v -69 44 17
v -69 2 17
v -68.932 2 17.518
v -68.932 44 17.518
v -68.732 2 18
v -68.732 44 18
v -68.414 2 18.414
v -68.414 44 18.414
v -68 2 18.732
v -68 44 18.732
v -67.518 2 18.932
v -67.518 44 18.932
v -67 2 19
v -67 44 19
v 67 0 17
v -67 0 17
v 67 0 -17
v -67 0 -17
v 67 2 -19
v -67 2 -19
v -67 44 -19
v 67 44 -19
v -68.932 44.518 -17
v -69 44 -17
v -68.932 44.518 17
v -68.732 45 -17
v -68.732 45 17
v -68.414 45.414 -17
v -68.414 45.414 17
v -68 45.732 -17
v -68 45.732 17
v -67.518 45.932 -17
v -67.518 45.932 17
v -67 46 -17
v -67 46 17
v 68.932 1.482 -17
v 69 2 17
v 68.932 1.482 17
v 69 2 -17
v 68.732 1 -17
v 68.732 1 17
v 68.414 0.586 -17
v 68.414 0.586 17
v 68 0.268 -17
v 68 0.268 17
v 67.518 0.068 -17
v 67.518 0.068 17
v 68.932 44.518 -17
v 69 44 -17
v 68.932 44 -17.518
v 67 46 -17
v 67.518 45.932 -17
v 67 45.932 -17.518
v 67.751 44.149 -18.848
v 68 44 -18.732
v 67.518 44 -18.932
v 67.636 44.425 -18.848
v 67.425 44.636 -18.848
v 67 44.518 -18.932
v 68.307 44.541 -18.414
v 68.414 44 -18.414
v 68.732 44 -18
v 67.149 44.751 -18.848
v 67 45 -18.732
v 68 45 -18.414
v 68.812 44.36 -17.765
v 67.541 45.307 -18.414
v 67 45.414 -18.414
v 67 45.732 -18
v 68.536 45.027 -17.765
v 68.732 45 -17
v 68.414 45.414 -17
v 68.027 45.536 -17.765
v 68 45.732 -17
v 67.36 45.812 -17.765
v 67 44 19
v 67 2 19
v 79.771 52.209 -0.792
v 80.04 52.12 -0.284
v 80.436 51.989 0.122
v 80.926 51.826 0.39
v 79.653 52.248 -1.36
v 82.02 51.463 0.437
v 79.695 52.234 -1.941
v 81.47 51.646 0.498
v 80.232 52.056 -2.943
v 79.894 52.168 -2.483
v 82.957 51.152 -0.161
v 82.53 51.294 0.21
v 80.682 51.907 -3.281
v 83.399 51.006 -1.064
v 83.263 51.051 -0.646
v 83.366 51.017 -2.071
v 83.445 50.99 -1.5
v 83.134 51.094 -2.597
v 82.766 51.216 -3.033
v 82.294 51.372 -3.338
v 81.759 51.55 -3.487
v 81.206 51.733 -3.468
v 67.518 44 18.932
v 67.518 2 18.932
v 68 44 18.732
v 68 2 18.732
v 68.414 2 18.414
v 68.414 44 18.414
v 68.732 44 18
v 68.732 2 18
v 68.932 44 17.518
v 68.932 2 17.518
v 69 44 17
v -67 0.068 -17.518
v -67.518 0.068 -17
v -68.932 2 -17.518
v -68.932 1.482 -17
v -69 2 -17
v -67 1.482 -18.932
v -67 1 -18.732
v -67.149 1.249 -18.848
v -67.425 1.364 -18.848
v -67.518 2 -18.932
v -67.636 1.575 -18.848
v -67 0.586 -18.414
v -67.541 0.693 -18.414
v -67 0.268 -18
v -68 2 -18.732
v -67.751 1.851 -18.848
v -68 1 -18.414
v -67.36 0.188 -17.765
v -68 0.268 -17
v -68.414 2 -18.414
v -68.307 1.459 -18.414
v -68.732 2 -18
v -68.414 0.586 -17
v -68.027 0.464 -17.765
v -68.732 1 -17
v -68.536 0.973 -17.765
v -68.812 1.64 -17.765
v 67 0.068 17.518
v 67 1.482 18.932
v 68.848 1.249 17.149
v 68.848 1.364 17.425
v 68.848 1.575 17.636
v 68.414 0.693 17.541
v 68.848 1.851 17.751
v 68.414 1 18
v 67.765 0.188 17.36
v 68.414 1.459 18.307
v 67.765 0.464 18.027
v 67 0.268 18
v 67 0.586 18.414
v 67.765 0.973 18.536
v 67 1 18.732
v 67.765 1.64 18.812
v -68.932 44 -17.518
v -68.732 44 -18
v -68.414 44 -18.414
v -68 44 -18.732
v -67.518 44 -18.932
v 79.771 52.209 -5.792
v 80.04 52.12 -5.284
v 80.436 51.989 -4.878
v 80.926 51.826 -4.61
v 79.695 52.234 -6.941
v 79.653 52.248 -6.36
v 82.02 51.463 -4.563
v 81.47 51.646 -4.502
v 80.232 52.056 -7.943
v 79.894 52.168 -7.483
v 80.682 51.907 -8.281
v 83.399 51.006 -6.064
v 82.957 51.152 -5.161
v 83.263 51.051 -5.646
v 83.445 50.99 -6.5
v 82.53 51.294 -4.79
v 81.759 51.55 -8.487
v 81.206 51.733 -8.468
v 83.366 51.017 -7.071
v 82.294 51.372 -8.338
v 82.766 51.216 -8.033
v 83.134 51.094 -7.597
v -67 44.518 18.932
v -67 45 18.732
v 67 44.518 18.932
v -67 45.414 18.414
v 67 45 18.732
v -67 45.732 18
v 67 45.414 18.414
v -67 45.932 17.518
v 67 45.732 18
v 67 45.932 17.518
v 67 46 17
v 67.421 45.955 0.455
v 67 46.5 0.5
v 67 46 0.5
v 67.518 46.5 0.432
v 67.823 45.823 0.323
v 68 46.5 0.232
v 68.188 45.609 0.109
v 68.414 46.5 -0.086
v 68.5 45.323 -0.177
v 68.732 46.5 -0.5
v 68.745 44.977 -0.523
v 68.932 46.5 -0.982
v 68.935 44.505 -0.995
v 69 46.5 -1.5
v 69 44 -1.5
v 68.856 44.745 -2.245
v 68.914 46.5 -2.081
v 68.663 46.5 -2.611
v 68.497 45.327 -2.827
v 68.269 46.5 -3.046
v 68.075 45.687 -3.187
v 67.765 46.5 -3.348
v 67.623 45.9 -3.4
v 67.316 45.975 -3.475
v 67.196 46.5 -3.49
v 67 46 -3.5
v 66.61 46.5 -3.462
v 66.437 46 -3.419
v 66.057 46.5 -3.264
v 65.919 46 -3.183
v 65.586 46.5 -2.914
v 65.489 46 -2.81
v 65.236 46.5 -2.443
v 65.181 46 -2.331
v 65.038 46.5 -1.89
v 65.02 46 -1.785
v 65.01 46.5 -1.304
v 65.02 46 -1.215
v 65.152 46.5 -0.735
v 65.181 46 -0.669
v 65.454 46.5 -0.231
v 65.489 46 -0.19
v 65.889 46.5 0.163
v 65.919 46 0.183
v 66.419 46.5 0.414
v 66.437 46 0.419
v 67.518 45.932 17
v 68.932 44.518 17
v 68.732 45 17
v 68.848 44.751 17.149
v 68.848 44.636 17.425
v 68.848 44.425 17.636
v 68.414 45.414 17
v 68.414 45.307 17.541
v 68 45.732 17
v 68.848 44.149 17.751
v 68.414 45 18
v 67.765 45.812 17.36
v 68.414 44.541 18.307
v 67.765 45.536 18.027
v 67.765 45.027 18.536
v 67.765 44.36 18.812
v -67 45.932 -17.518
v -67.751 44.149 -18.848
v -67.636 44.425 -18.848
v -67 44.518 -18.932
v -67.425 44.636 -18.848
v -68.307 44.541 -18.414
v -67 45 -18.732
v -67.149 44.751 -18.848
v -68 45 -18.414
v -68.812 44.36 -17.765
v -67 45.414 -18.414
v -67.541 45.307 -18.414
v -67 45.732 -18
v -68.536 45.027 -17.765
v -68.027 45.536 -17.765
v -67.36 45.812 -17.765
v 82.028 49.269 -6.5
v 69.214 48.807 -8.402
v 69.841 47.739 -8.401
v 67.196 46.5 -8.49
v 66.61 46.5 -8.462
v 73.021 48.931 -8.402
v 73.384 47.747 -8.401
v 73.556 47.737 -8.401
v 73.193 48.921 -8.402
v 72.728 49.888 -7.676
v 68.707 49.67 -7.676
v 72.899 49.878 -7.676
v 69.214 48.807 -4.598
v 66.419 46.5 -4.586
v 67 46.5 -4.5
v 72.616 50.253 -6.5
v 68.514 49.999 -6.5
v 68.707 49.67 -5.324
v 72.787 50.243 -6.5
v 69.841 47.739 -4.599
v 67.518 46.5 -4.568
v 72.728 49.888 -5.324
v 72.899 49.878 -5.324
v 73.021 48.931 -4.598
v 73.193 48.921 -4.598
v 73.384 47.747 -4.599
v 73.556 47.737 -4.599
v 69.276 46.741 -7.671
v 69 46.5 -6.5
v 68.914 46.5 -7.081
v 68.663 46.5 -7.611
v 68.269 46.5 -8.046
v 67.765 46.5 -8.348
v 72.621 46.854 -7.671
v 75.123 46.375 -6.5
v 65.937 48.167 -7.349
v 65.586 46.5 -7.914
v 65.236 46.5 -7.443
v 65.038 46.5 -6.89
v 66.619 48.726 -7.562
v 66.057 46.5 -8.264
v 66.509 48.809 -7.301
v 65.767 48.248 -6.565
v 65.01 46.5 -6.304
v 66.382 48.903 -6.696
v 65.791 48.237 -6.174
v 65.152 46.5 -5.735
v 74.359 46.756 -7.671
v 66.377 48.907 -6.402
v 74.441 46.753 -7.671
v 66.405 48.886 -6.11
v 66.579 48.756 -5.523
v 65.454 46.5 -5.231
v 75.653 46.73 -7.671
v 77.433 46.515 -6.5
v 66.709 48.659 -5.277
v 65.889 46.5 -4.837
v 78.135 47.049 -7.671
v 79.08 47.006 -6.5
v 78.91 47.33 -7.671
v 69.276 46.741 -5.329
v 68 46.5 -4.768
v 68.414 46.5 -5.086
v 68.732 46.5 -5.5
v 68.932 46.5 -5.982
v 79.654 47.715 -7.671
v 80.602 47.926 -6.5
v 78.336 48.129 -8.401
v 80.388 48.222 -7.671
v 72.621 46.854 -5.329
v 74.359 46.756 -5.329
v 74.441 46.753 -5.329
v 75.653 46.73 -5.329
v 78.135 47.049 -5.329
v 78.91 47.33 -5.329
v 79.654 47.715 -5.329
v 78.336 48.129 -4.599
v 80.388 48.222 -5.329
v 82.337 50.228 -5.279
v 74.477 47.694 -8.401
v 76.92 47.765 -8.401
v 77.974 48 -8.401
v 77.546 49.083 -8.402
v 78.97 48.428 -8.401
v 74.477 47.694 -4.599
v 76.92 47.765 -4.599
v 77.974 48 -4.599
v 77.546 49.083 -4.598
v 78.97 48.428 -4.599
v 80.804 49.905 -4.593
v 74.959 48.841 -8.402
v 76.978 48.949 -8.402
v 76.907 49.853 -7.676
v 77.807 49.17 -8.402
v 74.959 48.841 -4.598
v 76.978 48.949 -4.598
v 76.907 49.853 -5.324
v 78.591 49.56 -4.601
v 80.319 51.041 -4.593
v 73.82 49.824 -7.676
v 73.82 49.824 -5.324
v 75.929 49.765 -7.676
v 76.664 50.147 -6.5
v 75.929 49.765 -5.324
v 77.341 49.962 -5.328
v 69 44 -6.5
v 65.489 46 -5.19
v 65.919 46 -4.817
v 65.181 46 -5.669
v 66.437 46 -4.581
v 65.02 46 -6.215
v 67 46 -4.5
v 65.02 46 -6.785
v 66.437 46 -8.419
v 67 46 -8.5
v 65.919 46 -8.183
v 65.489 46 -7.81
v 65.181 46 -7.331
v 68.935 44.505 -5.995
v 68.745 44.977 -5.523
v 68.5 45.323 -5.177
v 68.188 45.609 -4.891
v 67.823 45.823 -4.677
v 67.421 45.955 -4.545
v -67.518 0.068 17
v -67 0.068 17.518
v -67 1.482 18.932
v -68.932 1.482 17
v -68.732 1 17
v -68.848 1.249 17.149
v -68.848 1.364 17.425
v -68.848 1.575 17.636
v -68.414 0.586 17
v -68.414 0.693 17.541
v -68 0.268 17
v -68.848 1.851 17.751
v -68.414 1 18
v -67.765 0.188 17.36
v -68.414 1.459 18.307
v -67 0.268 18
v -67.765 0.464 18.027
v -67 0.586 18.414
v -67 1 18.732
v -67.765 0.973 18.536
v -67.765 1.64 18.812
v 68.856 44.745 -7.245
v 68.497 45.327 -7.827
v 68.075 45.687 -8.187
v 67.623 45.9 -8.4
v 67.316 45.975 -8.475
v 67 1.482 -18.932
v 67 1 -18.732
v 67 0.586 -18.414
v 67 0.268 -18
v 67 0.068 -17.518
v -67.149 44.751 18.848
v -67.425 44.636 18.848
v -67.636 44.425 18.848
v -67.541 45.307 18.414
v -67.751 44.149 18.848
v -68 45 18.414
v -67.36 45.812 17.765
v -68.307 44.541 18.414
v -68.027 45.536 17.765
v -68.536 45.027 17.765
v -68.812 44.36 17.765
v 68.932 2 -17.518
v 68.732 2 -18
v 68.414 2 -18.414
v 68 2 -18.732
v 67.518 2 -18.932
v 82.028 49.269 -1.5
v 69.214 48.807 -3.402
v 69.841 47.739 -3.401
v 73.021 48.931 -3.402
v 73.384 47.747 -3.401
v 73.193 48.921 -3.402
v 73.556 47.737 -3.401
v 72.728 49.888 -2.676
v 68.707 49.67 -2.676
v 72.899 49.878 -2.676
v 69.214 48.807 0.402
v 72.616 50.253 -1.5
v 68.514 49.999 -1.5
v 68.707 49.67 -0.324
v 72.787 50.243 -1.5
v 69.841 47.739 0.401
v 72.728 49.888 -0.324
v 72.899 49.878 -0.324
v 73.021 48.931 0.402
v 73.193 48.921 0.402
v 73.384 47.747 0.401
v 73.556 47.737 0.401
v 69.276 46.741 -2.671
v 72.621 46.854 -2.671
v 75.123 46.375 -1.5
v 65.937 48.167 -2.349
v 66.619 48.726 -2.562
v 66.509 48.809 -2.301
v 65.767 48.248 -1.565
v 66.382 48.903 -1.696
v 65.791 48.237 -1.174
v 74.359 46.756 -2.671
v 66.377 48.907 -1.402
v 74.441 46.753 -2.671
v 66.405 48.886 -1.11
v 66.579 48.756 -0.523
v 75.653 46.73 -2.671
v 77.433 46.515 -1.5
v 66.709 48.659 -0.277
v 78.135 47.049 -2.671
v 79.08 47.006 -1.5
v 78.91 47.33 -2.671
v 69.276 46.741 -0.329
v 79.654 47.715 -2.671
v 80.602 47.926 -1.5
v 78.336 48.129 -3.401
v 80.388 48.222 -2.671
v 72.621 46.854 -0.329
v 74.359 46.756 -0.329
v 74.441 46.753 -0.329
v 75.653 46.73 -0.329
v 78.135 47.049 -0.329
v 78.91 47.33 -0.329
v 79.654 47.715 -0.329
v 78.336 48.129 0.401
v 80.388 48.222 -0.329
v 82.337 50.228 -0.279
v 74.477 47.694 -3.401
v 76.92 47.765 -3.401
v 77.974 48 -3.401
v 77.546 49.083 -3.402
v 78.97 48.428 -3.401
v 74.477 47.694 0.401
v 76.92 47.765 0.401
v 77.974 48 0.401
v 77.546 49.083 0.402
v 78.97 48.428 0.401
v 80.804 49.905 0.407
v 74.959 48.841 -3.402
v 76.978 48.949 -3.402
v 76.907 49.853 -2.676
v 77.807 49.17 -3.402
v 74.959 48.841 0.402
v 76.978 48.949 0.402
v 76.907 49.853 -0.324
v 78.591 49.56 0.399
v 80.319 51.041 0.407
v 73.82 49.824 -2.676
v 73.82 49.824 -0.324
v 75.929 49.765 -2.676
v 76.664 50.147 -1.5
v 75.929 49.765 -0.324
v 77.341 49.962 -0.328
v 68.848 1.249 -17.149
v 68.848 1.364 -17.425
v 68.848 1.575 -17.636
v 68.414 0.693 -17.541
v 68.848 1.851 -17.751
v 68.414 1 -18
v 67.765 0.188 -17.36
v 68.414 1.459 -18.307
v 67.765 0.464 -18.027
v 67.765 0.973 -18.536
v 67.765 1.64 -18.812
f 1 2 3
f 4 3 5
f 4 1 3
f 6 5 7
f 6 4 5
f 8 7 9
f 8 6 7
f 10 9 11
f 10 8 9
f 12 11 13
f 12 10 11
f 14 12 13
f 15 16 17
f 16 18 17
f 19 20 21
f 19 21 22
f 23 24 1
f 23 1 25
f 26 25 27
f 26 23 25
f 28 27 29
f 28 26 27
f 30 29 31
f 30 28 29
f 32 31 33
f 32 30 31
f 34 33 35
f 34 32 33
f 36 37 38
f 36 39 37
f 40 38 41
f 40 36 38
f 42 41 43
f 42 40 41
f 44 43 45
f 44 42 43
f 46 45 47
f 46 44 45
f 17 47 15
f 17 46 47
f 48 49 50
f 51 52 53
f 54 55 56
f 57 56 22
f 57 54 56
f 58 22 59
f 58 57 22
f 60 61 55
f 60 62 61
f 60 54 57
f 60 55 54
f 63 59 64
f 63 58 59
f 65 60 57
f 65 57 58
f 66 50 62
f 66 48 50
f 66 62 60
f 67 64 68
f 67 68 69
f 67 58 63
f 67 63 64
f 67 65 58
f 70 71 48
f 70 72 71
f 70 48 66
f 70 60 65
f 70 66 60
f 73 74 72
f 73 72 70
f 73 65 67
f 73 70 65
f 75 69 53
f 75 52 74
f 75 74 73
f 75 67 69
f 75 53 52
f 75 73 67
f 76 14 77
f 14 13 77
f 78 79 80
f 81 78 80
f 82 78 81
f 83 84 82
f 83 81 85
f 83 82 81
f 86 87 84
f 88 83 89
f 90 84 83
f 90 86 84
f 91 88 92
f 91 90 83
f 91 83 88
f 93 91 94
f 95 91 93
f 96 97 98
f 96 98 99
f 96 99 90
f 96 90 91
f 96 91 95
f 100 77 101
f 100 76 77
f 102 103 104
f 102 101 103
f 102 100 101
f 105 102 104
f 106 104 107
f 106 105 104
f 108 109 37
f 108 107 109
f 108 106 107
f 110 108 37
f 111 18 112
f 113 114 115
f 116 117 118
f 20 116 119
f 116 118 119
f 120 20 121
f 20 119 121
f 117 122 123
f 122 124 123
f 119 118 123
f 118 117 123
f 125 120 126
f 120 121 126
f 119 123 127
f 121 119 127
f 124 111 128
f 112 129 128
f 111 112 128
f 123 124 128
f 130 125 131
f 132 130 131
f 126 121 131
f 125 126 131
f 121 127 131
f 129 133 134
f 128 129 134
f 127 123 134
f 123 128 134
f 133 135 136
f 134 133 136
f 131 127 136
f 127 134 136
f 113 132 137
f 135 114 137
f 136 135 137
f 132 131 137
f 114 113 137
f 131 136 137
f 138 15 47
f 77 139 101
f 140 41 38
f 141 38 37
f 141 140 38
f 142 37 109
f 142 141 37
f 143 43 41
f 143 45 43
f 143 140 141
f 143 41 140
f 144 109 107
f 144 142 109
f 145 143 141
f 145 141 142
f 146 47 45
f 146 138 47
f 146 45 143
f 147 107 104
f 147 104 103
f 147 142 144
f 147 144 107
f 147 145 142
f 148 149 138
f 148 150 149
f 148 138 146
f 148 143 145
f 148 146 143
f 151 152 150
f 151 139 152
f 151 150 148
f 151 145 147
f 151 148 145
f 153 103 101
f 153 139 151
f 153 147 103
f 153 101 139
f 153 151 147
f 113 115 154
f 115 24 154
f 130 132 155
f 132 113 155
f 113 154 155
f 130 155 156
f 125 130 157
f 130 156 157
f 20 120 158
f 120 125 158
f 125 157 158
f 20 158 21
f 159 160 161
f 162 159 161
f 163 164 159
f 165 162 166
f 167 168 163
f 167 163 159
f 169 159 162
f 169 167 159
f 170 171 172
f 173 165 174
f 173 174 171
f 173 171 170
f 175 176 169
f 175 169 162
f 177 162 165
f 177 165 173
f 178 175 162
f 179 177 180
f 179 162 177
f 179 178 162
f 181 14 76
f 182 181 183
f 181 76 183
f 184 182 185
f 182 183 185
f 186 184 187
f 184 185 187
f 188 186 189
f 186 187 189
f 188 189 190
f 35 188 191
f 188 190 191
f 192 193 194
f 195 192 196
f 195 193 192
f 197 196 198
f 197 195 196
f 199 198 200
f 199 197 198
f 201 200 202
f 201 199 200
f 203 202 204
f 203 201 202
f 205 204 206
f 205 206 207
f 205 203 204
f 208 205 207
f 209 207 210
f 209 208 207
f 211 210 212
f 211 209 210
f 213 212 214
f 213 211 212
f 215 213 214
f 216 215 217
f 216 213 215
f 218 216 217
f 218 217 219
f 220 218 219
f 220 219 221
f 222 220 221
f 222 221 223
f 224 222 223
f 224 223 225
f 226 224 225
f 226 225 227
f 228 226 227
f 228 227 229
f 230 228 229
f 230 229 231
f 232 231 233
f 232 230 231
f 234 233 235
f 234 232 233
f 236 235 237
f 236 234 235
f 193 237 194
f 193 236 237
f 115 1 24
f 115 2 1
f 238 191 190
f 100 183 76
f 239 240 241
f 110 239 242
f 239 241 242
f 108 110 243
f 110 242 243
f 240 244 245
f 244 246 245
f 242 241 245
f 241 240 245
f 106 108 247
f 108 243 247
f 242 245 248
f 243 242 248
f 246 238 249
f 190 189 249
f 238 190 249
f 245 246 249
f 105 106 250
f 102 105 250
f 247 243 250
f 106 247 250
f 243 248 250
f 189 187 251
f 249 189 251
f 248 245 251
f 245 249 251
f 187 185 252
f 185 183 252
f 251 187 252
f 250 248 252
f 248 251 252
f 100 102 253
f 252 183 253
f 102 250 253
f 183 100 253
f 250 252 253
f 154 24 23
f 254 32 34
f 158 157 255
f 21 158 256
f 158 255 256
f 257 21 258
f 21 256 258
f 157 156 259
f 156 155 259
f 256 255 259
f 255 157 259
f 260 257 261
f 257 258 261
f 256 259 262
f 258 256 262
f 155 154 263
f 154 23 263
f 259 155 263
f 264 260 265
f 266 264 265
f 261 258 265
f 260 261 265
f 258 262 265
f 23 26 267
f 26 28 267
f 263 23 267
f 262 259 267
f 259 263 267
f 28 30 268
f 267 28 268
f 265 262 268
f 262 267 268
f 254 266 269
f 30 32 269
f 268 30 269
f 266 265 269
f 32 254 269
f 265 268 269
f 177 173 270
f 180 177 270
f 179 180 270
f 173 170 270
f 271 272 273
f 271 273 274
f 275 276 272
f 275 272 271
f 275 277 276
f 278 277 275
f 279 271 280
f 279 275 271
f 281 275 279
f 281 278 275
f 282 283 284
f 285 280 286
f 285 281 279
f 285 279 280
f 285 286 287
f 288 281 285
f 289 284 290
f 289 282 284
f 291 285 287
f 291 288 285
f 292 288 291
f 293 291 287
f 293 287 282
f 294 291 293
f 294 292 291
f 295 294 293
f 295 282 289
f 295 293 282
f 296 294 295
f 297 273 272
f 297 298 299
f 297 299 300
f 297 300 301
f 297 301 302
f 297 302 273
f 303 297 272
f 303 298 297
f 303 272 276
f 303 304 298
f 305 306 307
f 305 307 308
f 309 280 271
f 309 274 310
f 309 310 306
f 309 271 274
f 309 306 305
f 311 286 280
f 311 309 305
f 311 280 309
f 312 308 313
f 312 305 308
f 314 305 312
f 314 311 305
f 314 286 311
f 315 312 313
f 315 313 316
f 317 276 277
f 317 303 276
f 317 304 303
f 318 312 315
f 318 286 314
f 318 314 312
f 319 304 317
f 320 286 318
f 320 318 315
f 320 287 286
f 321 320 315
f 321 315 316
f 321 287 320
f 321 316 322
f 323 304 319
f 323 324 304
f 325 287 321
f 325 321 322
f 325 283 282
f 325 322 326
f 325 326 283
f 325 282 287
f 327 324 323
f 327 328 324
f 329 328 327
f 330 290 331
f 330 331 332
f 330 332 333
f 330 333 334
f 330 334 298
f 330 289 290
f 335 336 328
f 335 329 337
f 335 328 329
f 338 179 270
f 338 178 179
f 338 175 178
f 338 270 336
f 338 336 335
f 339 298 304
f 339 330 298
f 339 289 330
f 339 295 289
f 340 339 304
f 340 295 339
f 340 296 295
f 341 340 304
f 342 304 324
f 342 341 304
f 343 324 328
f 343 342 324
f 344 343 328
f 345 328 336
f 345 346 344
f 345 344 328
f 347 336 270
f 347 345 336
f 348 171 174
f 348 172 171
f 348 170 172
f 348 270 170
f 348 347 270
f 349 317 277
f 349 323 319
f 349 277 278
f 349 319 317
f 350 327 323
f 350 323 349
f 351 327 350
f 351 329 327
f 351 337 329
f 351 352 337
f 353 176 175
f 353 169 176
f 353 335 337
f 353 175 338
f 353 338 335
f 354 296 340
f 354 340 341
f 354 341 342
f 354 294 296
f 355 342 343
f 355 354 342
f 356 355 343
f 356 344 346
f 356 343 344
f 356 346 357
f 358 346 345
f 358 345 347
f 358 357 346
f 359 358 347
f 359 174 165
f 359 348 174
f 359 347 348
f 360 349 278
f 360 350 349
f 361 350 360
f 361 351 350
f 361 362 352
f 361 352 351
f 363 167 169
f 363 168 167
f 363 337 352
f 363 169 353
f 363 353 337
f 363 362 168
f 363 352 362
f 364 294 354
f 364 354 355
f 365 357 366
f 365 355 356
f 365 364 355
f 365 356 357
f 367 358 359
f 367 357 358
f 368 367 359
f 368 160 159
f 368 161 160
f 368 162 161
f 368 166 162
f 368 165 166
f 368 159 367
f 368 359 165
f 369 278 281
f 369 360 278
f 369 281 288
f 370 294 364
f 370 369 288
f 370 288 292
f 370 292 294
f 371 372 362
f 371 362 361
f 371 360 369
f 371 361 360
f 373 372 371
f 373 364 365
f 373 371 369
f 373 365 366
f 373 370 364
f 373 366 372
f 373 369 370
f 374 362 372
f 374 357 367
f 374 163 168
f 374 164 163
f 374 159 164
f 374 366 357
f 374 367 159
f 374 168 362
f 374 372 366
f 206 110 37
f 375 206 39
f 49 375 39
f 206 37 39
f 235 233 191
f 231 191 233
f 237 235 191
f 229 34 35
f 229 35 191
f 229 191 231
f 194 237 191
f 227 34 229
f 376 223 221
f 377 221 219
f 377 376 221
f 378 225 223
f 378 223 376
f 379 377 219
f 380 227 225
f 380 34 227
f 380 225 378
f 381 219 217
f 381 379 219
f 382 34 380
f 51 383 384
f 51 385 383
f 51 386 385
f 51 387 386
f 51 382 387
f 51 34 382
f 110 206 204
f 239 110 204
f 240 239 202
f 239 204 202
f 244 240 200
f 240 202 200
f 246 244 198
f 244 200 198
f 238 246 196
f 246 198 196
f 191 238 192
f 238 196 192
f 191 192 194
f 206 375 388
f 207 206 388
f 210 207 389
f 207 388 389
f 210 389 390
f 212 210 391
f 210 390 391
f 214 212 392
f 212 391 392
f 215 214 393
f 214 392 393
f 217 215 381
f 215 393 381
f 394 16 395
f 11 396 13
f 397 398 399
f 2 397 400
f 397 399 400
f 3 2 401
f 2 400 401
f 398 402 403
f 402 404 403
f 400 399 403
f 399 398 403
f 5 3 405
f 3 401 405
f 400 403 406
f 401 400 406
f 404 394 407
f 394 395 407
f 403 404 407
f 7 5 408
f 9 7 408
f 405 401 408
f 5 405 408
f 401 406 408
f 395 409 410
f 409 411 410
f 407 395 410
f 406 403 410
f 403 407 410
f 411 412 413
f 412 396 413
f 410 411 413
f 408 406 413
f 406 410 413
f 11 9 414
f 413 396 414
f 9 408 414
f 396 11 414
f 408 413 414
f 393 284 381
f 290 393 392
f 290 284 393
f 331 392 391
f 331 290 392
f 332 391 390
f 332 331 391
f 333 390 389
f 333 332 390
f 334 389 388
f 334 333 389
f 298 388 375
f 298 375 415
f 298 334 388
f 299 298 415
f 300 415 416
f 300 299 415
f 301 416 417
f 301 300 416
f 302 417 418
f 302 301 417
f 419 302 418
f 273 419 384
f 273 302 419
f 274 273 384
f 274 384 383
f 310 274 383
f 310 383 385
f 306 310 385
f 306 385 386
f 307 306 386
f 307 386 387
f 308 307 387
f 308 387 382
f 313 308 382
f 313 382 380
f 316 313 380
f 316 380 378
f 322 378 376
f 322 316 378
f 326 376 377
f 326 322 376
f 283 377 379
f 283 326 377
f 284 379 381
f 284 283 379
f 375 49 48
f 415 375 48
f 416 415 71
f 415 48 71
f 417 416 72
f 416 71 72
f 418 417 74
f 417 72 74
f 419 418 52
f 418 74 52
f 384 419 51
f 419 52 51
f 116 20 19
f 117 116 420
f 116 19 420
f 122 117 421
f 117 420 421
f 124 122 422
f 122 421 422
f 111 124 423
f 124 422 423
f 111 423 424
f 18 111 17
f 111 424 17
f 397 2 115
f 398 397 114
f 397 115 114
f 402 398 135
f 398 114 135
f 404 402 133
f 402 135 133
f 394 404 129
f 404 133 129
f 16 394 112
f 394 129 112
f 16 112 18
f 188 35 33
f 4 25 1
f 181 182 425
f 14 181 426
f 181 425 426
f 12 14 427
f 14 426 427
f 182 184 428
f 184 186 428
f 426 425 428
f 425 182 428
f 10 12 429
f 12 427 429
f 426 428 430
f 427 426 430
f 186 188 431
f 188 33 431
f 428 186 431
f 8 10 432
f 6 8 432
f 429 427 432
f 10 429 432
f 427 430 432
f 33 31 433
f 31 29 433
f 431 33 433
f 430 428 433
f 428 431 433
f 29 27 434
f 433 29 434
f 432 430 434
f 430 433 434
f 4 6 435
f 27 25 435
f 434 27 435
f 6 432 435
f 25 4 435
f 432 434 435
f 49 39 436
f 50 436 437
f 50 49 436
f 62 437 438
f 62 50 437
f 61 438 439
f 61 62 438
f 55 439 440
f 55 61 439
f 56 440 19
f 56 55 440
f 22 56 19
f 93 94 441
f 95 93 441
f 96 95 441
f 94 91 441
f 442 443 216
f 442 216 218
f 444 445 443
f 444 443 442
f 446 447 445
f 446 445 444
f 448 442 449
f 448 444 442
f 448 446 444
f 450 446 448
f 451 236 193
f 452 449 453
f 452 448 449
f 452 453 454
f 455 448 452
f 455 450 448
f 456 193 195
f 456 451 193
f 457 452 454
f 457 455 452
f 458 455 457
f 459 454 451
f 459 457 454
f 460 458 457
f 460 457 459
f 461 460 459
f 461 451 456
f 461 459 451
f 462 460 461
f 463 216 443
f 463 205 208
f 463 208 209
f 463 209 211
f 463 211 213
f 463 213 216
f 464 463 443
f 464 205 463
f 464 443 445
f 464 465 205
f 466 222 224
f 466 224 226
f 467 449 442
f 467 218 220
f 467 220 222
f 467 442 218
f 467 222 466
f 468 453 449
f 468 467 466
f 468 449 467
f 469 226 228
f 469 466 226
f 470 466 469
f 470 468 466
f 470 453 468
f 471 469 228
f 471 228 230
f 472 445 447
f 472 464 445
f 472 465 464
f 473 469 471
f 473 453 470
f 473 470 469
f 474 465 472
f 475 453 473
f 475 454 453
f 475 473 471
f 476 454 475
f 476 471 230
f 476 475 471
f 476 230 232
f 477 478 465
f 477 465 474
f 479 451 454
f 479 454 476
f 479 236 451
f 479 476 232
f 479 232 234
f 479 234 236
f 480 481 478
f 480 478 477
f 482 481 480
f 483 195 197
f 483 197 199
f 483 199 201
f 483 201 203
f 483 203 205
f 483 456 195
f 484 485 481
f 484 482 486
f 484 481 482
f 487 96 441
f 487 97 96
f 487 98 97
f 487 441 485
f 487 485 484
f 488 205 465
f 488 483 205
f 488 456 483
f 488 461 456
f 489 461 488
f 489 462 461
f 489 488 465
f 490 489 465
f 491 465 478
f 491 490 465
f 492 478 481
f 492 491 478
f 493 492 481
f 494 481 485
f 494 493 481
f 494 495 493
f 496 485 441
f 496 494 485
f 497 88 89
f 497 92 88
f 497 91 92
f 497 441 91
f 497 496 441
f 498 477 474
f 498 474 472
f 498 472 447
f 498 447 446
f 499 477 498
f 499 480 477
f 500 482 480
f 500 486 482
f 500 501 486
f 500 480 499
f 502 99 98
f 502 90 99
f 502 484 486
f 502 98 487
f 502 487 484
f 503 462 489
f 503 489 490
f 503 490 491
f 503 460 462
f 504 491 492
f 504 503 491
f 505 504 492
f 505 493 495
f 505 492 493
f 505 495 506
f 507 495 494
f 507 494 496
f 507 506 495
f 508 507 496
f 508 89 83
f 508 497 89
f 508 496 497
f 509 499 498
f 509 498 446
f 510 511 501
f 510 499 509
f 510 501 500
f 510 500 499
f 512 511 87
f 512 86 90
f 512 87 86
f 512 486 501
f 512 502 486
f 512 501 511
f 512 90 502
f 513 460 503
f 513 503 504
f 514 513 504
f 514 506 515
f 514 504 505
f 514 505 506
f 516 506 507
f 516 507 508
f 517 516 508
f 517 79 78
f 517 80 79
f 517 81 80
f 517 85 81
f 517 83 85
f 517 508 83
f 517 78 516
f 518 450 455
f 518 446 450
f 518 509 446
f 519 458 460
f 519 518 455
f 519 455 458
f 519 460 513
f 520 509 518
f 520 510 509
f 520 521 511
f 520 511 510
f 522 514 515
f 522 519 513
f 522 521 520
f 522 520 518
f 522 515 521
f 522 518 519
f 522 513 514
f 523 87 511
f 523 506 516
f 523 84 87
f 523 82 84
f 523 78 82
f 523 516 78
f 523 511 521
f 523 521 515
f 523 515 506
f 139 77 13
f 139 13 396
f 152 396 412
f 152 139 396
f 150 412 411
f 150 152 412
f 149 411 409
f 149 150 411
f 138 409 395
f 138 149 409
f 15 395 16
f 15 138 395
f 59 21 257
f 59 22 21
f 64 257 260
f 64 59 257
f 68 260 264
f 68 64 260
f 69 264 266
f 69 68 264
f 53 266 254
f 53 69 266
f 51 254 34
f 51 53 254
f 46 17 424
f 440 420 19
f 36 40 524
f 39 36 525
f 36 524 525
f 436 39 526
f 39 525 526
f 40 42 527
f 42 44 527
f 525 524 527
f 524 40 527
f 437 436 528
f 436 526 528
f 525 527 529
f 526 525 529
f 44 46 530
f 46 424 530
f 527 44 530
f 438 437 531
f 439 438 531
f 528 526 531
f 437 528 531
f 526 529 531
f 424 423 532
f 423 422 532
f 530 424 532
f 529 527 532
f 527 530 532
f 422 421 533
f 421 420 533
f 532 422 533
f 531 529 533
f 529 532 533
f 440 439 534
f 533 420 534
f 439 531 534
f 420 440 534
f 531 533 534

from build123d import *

# Parameters (mm, degrees)
SZKIC1_W                         = 138
SZKIC1_H                         = 38
DODANIE_WYCI_GNI_CIE1_DEPTH      = 46
ZAOKR_GLENIE1_R                  = 2
DODANIE_WYCI_GNI_CIE2_REACH      = 87.348
DODANIE_WYCI_GNI_CIE2_END_RADIUS = 2
SZKIC3_R                         = 2
SZKIC5_R                         = 2


with BuildPart() as part:
    # Szkic1 → Dodanie-wyciągnięcie1 (new body)
    with BuildSketch(Plane(origin=(0, 0, 0), x_dir=(1, 0, 0), z_dir=(0, 1, 0))):
        Rectangle(SZKIC1_W, SZKIC1_H)
    extrude(amount=DODANIE_WYCI_GNI_CIE1_DEPTH)

    # Zaokrąglenie1
    zaokr_glenie1_edges = [part.edges().sort_by_distance(p)[0] for p in [
        (-69, 46, 0),
        (0, 46, 19),
        (69, 46, 0),
        (0, 0, 19),
        (-69, 0, 0),
        (0, 0, -19),
        (69, 0, 0),
        (69, 23, 19),
        (-69, 23, 19),
        (-69, 23, -19),
        (69, 23, -19),
        (0, 46, -19),
    ]]
    fillet(zaokr_glenie1_edges, radius=ZAOKR_GLENIE1_R)

    # Dodanie-wyciągnięcie2: up to this cylinder (the profile starts outside it)
    dodanie_wyci_gni_cie2_end = Plane(origin=(67, 44, -4), z_dir=(0, 0, -1)) * Cylinder(DODANIE_WYCI_GNI_CIE2_END_RADIUS, 184.696, mode=Mode.PRIVATE)
    # Szkic3 → Dodanie-wyciągnięcie2 (add, up to the surface)
    with BuildSketch(Plane(origin=(0, 46.5, 0), x_dir=(1, 0, 0), z_dir=(0, 1, 0)), mode=Mode.PRIVATE) as dodanie_wyci_gni_cie2_sk1:
        with Locations(Location((67, 6.5, 0), (0, 0, 270))):
            Circle(SZKIC3_R)
    dodanie_wyci_gni_cie2_tool1 = extrude(dodanie_wyci_gni_cie2_sk1.sketch, amount=-DODANIE_WYCI_GNI_CIE2_REACH, mode=Mode.PRIVATE) - dodanie_wyci_gni_cie2_end
    add(dodanie_wyci_gni_cie2_tool1.solids().sort_by_distance((67, 46.5, -6.5))[0])
    # Szkic3 → Dodanie-wyciągnięcie2 (add, up to the surface)
    with BuildSketch(Plane(origin=(0, 46.5, 0), x_dir=(1, 0, 0), z_dir=(0, 1, 0)), mode=Mode.PRIVATE) as dodanie_wyci_gni_cie2_sk2:
        with Locations(Location((67, 1.5, 0), (0, 0, 270))):
            Circle(SZKIC3_R)
    dodanie_wyci_gni_cie2_tool2 = extrude(dodanie_wyci_gni_cie2_sk2.sketch, amount=-DODANIE_WYCI_GNI_CIE2_REACH, mode=Mode.PRIVATE) - dodanie_wyci_gni_cie2_end
    add(dodanie_wyci_gni_cie2_tool2.solids().sort_by_distance((67, 46.5, -1.5))[0])

    # Wyciągnięcie po ścieżce1: sweep along a path in Szkic4
    with BuildLine() as wyci_gni_cie_po_cie_ce1_path:  # in the path sketch's own coordinates; laid on its plane below (add() does not lay a ready-made edge on the line's plane)
        add(Edge.make_bspline(
            [(-67, 46.5), (-67.812300982, 48.700029071), (-76.558056505, 48.053598024), (-78.81196866, 48.196334496), (-81.546543778, 51.620091174)],
            knots=[0, 0, 0, 0, 0.368299585, 1, 1, 1, 1], degree=3))
    # Szkic5 → Wyciągnięcie po ścieżce1 (sweep)
    with BuildSketch(Plane(origin=(0, 46.5, 0), x_dir=(1, 0, 0), z_dir=(0, 1, 0))):
        with Locations((67, 6.5)):
            Circle(SZKIC5_R)
        with Locations((67, 1.5)):
            Circle(SZKIC5_R)
    sweep(path=Plane(origin=(0, 0, -4), x_dir=(-1, 0, 0), z_dir=(0, 0, -1)) * wyci_gni_cie_po_cie_ce1_path.line)


solid = part.part
